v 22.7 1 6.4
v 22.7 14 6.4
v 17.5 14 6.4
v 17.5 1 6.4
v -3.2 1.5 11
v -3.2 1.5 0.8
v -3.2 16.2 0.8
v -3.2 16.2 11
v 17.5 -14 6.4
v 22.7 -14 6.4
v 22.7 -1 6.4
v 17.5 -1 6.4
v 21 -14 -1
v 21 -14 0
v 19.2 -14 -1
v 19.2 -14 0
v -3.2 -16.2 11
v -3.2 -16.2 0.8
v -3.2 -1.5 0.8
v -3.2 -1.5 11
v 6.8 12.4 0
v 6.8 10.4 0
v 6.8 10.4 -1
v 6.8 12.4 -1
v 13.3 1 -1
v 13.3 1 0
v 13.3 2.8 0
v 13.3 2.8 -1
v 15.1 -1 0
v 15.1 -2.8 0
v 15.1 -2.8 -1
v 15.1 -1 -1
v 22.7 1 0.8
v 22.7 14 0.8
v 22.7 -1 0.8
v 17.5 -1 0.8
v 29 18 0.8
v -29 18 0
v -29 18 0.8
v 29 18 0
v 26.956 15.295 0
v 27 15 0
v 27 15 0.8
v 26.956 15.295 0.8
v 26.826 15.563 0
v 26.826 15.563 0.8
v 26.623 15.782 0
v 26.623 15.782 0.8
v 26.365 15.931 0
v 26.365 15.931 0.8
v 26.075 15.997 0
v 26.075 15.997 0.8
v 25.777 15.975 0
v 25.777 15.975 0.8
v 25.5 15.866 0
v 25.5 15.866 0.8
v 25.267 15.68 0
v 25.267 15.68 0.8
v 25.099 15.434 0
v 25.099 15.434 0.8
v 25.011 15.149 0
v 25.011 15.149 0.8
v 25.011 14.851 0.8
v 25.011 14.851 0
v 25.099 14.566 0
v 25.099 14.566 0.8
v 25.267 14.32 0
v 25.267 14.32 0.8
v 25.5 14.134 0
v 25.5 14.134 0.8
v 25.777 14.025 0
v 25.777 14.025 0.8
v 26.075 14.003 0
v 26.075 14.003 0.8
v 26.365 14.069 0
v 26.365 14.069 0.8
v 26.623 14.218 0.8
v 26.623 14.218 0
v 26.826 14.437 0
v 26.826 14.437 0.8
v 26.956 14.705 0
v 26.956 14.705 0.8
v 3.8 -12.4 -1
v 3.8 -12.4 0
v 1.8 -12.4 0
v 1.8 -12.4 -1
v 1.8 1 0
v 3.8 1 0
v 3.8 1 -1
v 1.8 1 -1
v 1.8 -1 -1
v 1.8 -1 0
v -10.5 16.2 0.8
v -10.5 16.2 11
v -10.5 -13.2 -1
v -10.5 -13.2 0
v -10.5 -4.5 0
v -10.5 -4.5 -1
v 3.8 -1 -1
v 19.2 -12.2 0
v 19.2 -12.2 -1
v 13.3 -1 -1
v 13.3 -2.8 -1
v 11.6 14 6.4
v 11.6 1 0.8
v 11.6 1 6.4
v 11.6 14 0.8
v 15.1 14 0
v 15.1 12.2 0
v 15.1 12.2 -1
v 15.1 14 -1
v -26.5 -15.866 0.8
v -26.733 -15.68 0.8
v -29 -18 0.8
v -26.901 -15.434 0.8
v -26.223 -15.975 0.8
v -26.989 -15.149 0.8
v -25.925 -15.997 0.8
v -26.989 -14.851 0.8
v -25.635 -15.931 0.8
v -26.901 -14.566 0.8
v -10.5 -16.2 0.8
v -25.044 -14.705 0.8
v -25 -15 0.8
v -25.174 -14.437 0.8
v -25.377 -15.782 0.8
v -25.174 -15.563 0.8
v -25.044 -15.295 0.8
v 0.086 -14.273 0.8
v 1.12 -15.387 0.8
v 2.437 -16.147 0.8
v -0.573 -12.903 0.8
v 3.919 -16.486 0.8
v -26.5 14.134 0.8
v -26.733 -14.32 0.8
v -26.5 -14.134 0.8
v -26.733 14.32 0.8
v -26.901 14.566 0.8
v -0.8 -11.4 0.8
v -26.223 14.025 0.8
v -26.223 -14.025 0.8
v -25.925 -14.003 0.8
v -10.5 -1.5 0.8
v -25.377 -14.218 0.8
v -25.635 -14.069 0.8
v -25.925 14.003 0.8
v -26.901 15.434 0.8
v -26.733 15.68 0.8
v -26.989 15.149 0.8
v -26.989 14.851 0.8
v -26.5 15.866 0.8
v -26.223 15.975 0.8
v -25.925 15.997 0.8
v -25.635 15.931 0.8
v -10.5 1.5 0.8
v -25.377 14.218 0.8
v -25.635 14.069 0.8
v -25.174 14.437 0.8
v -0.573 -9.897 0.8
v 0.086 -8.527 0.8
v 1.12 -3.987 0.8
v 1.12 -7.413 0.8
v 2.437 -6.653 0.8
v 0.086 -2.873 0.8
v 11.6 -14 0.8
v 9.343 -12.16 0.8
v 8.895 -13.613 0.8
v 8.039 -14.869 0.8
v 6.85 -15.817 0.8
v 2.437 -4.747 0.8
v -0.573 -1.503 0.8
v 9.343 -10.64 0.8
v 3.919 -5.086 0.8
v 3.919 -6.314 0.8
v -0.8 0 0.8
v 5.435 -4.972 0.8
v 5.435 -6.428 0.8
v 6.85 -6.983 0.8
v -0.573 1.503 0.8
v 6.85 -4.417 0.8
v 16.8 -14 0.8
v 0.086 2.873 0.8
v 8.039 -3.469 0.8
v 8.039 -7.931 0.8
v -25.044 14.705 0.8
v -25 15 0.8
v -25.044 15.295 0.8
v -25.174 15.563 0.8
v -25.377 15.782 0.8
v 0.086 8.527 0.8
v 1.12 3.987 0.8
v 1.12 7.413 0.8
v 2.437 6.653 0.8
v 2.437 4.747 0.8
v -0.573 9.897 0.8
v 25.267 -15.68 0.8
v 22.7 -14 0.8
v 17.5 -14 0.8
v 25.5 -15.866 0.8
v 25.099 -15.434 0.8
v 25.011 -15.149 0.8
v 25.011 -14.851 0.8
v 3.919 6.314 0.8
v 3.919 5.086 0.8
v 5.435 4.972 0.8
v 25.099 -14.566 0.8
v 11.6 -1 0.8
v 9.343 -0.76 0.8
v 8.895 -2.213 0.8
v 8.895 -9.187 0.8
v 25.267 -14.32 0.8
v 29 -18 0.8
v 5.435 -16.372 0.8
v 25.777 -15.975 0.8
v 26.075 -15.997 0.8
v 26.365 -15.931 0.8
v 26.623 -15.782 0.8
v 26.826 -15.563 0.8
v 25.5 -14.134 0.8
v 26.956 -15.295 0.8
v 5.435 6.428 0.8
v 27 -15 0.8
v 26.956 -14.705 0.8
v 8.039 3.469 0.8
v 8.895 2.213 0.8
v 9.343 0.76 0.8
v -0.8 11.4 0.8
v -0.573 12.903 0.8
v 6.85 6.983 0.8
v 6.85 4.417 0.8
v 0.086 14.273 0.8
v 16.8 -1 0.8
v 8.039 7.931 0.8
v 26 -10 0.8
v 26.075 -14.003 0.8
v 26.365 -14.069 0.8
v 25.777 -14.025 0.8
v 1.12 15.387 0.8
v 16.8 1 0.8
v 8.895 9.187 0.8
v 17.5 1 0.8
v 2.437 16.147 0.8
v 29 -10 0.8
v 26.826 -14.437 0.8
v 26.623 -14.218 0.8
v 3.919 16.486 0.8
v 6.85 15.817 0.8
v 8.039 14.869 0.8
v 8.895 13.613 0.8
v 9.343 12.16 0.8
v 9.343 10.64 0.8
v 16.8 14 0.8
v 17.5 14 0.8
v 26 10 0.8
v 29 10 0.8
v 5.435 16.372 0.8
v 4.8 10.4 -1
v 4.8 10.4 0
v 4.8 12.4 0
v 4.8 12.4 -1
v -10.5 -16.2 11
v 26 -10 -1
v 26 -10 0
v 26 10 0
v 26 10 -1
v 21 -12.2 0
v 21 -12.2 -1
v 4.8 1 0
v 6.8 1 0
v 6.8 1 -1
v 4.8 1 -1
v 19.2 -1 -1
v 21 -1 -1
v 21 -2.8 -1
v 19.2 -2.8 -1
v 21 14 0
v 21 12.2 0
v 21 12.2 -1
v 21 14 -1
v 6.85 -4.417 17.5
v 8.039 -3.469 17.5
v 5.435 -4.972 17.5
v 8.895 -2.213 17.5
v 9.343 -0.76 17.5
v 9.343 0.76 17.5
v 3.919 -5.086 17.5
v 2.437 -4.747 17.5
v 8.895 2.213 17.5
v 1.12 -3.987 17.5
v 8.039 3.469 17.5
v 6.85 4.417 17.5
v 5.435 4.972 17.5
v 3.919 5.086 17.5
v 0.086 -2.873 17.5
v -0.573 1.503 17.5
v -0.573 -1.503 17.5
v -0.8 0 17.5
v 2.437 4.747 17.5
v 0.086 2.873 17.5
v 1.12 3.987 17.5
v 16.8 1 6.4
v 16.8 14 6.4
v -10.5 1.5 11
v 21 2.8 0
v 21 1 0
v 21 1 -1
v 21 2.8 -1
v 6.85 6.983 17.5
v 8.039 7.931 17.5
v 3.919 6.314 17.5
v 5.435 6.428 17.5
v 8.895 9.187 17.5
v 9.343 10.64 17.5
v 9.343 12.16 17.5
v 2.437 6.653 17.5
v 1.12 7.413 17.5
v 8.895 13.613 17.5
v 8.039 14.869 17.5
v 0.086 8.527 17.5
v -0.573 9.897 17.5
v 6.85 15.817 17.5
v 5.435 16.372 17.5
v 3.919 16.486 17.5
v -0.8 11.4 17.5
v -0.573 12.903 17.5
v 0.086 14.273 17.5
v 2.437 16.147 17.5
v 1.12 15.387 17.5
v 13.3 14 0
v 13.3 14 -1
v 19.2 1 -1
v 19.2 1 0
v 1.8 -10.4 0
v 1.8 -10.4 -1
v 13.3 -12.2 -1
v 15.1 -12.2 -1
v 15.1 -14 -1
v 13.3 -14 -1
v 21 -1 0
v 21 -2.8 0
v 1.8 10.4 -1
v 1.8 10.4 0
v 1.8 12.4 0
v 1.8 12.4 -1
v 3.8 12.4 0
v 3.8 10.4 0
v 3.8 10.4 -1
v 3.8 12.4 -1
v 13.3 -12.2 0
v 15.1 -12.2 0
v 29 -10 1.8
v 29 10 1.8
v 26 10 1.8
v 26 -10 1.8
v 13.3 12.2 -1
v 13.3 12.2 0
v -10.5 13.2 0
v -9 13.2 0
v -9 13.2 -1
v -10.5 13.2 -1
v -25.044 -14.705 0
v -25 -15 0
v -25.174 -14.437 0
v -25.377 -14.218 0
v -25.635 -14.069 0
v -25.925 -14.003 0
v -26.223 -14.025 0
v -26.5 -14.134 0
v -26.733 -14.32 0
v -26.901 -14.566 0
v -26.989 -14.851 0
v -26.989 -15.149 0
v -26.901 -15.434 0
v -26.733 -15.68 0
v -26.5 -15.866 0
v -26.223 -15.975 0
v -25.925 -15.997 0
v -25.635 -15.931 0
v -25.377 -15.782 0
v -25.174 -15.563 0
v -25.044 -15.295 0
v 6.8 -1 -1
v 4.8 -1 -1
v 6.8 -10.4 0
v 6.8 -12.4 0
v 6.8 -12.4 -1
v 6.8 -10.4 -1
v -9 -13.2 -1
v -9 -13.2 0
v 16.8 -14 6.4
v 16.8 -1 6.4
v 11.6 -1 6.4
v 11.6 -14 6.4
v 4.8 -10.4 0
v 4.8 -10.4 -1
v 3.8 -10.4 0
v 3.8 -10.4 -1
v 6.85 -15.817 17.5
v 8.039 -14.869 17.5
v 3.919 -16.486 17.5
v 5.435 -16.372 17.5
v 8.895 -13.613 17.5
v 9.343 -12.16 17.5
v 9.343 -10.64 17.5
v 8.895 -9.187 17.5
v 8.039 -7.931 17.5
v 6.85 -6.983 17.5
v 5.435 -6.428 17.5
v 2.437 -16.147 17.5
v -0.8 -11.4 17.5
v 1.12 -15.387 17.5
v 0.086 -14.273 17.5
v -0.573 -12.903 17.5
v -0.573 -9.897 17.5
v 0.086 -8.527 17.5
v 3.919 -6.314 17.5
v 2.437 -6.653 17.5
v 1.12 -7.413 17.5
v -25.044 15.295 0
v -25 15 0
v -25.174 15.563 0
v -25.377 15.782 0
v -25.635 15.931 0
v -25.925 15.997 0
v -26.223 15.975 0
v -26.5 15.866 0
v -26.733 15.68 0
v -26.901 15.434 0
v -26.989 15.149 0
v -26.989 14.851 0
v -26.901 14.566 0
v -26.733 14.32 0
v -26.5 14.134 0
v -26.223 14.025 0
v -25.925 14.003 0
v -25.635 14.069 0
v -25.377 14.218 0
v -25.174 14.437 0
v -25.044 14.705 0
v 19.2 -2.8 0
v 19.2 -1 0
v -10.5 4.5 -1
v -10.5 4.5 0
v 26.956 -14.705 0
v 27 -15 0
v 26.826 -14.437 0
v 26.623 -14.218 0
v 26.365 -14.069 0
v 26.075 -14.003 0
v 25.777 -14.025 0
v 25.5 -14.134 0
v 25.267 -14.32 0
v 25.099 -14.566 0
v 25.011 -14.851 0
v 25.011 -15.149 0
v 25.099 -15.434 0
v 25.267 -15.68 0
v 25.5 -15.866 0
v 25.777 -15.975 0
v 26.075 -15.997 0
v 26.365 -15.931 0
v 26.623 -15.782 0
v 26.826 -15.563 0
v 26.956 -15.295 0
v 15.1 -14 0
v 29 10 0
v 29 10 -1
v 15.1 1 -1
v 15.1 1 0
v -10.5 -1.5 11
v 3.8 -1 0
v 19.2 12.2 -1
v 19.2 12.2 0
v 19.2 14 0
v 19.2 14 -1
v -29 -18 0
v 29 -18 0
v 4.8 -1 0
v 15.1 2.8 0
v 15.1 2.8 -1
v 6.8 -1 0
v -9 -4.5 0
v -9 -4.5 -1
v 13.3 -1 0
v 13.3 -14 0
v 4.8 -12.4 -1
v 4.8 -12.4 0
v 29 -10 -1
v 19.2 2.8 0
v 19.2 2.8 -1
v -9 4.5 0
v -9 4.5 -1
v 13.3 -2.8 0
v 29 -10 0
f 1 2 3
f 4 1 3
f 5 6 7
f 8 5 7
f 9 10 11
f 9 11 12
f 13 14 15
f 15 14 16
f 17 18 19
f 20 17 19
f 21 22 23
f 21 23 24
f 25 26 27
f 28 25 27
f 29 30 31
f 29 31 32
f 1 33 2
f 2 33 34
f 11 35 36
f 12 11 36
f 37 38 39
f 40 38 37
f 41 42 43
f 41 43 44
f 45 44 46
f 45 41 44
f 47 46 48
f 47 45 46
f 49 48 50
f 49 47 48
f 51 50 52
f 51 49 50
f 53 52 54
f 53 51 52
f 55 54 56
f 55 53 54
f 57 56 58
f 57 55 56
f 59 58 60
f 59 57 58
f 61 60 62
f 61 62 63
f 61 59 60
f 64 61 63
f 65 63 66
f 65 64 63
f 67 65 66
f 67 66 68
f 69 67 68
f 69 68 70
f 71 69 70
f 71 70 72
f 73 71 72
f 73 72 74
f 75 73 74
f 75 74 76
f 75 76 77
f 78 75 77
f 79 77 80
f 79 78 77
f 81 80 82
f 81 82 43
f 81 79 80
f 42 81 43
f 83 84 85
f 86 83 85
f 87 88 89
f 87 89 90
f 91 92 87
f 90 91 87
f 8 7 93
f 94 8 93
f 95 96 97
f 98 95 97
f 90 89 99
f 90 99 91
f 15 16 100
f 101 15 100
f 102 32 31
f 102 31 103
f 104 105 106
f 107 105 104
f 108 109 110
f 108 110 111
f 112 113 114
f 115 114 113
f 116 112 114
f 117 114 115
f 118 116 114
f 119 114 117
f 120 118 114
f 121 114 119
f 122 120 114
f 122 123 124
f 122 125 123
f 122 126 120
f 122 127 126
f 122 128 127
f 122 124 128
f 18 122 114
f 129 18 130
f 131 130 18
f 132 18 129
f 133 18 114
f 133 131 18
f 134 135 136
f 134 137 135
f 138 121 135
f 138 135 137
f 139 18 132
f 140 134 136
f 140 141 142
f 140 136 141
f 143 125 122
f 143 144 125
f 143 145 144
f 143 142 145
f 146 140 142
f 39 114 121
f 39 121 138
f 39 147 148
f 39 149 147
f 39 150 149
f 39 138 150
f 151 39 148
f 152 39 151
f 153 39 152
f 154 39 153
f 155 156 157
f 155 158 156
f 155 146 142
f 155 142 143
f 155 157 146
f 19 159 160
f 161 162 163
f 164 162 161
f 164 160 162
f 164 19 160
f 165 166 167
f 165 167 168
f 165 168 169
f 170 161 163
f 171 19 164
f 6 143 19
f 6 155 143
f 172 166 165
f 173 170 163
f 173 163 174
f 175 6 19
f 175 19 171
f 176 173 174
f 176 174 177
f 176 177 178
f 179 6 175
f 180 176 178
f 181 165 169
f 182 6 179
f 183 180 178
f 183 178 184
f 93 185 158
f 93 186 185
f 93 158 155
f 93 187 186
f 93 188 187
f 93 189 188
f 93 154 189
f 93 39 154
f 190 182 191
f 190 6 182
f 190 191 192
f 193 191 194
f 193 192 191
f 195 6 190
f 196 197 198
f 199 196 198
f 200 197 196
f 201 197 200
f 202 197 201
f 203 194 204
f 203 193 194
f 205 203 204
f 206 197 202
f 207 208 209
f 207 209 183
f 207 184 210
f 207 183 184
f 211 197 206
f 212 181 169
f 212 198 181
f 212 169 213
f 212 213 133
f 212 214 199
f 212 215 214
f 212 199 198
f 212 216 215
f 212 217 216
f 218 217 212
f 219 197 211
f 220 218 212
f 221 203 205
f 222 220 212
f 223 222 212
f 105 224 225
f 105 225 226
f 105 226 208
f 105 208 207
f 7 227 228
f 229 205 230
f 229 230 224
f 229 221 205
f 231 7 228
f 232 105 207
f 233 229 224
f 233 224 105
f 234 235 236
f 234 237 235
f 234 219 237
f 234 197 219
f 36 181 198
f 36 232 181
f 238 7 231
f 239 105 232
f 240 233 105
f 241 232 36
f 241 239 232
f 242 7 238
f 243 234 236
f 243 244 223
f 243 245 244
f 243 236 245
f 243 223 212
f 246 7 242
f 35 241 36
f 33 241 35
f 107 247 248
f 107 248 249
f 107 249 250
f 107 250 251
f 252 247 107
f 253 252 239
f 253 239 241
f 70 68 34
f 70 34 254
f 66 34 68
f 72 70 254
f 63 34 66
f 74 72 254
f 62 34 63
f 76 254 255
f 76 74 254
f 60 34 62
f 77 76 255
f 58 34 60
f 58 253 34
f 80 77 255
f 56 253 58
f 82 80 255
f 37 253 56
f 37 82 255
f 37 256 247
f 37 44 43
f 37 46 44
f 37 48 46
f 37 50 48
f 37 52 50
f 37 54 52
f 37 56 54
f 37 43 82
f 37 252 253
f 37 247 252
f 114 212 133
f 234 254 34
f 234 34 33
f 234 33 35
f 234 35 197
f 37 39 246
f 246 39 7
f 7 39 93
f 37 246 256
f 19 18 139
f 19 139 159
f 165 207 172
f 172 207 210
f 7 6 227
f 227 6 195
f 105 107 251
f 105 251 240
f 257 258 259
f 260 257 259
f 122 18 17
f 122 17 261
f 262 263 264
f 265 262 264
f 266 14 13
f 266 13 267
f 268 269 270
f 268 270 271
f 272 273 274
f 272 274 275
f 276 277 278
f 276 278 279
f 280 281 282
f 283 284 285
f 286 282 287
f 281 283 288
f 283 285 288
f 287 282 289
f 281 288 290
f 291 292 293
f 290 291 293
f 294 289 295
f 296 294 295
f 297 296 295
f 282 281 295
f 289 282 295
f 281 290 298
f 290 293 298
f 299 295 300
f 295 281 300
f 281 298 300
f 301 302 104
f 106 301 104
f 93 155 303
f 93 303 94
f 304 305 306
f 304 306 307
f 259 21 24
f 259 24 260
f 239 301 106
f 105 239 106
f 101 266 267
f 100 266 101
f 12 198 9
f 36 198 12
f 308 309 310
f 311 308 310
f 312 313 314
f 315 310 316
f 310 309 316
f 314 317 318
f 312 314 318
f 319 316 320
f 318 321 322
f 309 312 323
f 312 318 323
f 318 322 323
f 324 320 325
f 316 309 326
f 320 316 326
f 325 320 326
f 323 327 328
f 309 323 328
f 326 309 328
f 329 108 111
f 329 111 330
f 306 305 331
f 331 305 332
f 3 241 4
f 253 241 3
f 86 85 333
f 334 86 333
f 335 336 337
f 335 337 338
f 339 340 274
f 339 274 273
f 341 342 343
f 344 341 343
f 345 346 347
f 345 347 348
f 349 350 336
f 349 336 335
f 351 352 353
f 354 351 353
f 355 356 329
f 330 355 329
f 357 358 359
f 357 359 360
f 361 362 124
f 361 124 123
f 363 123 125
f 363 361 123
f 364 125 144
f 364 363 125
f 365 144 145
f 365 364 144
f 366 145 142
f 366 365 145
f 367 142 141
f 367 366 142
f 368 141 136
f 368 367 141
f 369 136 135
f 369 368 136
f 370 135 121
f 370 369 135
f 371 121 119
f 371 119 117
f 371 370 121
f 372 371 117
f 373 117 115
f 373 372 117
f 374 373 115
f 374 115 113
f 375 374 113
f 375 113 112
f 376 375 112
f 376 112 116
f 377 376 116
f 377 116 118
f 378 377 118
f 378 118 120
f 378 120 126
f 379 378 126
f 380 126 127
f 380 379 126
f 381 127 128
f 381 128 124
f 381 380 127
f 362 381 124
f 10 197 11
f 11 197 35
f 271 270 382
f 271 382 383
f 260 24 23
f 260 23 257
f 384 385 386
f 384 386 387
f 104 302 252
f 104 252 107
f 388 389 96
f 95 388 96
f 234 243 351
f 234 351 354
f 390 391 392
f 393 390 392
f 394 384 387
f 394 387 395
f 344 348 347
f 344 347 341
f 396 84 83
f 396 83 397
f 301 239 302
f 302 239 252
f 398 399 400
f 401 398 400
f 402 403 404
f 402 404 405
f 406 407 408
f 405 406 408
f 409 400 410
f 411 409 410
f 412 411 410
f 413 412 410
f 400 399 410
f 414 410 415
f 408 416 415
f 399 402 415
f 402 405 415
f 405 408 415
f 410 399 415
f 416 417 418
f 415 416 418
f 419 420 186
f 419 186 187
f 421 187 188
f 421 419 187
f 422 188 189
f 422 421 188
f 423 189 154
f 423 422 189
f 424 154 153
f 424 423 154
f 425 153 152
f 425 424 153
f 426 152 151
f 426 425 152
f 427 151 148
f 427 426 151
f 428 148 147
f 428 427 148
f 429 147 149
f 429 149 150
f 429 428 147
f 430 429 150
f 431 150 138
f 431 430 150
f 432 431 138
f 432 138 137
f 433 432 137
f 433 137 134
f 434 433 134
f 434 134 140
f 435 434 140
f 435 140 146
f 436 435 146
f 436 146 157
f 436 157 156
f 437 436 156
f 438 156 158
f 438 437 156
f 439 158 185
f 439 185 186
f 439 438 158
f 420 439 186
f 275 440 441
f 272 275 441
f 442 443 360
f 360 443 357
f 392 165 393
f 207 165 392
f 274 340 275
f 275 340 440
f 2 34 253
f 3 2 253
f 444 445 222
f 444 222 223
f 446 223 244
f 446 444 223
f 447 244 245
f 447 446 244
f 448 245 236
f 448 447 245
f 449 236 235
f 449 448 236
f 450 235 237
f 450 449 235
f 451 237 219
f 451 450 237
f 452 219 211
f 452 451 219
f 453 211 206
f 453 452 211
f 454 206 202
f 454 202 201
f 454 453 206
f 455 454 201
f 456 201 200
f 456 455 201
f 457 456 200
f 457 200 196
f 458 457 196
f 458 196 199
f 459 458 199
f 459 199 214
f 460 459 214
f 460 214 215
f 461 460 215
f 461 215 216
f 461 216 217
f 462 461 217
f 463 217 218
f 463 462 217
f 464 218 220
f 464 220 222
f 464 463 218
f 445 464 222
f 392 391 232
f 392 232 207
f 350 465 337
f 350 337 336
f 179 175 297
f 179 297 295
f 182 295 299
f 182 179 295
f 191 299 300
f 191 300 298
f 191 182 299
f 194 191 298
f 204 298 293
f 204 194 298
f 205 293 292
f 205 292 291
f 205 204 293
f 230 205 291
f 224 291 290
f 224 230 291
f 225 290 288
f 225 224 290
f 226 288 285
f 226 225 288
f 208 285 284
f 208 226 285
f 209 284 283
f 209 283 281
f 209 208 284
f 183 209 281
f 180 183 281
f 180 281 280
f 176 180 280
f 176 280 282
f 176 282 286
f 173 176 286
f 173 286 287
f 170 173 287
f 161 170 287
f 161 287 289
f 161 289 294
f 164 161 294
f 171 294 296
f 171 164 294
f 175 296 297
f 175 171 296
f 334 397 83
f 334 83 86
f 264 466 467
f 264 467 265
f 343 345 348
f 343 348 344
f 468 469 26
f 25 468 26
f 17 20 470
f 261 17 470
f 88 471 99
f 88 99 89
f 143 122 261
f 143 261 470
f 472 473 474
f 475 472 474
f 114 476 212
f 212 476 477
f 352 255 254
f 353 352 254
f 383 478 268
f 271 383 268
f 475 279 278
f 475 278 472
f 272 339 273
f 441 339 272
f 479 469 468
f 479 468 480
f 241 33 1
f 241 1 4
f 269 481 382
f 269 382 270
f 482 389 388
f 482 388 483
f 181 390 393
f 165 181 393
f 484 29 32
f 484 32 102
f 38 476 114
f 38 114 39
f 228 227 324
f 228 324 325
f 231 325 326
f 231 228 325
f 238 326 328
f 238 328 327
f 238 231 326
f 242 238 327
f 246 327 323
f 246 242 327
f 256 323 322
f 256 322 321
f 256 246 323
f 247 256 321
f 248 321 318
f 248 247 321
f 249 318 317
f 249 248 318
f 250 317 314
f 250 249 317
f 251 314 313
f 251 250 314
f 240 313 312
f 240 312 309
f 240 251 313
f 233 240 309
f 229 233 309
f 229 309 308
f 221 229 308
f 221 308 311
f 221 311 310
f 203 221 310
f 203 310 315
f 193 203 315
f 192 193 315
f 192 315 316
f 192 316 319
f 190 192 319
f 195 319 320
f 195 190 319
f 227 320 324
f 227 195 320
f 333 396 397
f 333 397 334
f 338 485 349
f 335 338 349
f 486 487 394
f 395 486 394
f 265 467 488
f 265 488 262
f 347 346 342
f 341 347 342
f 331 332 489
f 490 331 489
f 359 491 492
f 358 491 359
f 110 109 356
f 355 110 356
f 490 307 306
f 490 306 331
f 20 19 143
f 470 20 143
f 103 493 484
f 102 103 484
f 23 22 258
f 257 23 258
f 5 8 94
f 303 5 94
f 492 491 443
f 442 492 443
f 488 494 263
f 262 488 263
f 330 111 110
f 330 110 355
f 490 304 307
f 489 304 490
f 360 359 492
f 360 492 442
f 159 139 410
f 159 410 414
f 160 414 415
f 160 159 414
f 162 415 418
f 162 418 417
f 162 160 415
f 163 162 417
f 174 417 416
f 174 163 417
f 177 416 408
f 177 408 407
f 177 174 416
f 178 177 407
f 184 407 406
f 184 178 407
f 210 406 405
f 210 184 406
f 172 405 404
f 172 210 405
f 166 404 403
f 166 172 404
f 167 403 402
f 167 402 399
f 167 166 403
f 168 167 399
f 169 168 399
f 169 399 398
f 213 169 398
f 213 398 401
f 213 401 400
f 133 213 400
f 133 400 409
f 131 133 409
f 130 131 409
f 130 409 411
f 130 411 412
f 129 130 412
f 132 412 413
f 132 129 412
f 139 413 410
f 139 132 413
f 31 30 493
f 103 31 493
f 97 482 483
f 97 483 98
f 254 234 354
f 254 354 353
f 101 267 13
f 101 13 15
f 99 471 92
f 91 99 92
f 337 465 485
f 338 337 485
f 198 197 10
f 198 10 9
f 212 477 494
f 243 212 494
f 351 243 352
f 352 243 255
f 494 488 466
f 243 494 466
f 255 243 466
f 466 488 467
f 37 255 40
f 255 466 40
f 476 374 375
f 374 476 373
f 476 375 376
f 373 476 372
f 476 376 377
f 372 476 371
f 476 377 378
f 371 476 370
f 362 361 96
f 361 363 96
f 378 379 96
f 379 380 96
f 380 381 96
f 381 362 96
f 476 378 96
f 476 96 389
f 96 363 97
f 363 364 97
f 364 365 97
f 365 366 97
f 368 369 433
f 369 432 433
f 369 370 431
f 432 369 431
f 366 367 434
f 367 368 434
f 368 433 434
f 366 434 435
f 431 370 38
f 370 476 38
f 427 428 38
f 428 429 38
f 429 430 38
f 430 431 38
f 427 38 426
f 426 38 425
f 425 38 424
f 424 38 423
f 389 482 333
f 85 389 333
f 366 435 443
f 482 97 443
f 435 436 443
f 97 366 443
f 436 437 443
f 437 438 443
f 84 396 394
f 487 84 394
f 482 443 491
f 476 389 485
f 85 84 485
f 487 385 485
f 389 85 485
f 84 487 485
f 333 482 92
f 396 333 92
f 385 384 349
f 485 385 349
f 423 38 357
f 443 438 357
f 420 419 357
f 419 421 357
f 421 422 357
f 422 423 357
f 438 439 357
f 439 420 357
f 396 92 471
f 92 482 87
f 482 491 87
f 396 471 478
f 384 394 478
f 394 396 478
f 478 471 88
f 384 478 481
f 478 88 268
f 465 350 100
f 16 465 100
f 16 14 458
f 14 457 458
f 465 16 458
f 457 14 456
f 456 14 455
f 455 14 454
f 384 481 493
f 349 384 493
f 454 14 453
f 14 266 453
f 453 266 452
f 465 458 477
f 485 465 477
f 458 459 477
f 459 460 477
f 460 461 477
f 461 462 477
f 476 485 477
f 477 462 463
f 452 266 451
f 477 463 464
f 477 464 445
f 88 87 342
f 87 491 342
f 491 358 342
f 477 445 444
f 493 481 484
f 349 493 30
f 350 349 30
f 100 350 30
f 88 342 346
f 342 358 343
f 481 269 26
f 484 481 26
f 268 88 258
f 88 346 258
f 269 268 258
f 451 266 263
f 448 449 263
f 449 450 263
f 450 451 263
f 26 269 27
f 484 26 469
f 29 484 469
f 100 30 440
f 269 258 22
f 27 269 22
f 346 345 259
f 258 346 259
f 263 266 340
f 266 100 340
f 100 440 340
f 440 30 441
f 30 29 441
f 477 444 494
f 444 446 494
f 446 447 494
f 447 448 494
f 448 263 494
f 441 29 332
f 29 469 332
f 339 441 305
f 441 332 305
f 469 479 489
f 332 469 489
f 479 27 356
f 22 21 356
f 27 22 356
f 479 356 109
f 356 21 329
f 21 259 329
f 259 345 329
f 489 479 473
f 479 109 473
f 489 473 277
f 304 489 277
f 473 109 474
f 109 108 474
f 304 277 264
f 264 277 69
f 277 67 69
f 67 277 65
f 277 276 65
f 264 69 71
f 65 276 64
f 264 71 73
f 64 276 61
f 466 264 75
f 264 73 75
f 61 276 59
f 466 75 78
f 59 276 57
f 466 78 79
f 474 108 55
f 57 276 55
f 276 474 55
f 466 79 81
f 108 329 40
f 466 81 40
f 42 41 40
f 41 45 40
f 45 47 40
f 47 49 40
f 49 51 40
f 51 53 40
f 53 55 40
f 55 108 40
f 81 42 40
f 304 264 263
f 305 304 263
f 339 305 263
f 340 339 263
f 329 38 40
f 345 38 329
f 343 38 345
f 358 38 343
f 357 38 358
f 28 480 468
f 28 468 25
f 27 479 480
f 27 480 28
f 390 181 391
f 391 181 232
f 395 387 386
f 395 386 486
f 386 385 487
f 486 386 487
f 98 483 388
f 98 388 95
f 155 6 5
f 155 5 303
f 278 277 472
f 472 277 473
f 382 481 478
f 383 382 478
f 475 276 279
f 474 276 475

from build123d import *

# Parameters (mm, degrees)
SKETCH_1_W      = 58
SKETCH_1_H      = 36
SKETCH_1_R      = 1
EXTRUDE_1_DEPTH = 0.8
SKETCH_2_W      = 1.8
SKETCH_2_H      = 1.8
EXTRUDE_2_DEPTH = 1
EXTRUDE_START   = -0.8
SKETCH_2_3_W    = 5.2
SKETCH_2_3_H    = 13
EXTRUDE_3_DEPTH = 5.6
SKETCH_3_W      = 1.5
SKETCH_3_H      = 8.7
EXTRUDE_4_DEPTH = 1
SKETCH_3_3_W    = 7.3
SKETCH_3_3_H    = 14.7
EXTRUDE_5_DEPTH = 10.2
SKETCH_4_W      = 2
SKETCH_4_H      = 2
EXTRUDE_6_DEPTH = 1
SKETCH_4_3_R    = 5.1
EXTRUDE_7_DEPTH = 16.7
SKETCH_5_W      = 3
SKETCH_5_H      = 20
EXTRUDE_8_DEPTH = 1
SKETCH_5_2_W    = 3
SKETCH_5_2_H    = 20
EXTRUDE_9_DEPTH = 1


with BuildPart() as part:
    # 草图1 → 凸台-拉伸1 (new body)
    with BuildSketch(Plane.XY):
        Rectangle(SKETCH_1_W, SKETCH_1_H)
        with Locations((-26, -15)):
            Circle(SKETCH_1_R, mode=Mode.SUBTRACT)
        with Locations((-26, 15)):
            Circle(SKETCH_1_R, mode=Mode.SUBTRACT)
        with Locations((26, 15)):
            Circle(SKETCH_1_R, mode=Mode.SUBTRACT)
        with Locations((26, -15)):
            Circle(SKETCH_1_R, mode=Mode.SUBTRACT)
    extrude(amount=EXTRUDE_1_DEPTH)

    # 草图2 → 凸台-拉伸2 (add)
    with BuildSketch(Plane(origin=(0, 0, 0), x_dir=(-1, 0, 0), z_dir=(0, 0, -1))):
        with Locations((-20.1, -13.1)):
            Rectangle(SKETCH_2_W, SKETCH_2_H)
        with Locations((-20.1, -1.9)):
            Rectangle(SKETCH_2_W, SKETCH_2_H)
        with Locations((-20.1, 1.9)):
            Rectangle(SKETCH_2_W, SKETCH_2_H)
        with Locations((-20.1, 13.1)):
            Rectangle(SKETCH_2_W, SKETCH_2_H)
        with Locations((-14.2, 13.1)):
            Rectangle(SKETCH_2_W, SKETCH_2_H)
        with Locations((-14.2, 1.9)):
            Rectangle(SKETCH_2_W, SKETCH_2_H)
        with Locations((-14.2, -1.9)):
            Rectangle(SKETCH_2_W, SKETCH_2_H)
        with Locations((-14.2, -13.1)):
            Rectangle(SKETCH_2_W, SKETCH_2_H)
    extrude(amount=EXTRUDE_2_DEPTH)

    # 草图2<3> → 凸台-拉伸3 (add)
    with BuildSketch(Plane(origin=(0, 0, 0), x_dir=(-1, 0, 0), z_dir=(0, 0, -1)).offset(EXTRUDE_START)):
        with Locations((-20.1, 7.5)):
            Rectangle(SKETCH_2_3_W, SKETCH_2_3_H)
        with Locations((-14.2, 7.5)):
            Rectangle(SKETCH_2_3_W, SKETCH_2_3_H)
        with Locations((-20.1, -7.5)):
            Rectangle(SKETCH_2_3_W, SKETCH_2_3_H)
        with Locations((-14.2, -7.5)):
            Rectangle(SKETCH_2_3_W, SKETCH_2_3_H)
    extrude(amount=-EXTRUDE_3_DEPTH)

    # 草图3 → 凸台-拉伸4 (add)
    with BuildSketch(Plane(origin=(0, 0, 0), x_dir=(-1, 0, 0), z_dir=(0, 0, -1))):
        with Locations((9.75, 8.85)):
            Rectangle(SKETCH_3_W, SKETCH_3_H)
        with Locations((9.75, -8.85)):
            Rectangle(SKETCH_3_W, SKETCH_3_H)
    extrude(amount=EXTRUDE_4_DEPTH)

    # 草图3<3> → 凸台-拉伸5 (add)
    with BuildSketch(Plane(origin=(0, 0, 0), x_dir=(-1, 0, 0), z_dir=(0, 0, -1)).offset(EXTRUDE_START)):
        with Locations((6.85, 8.85)):
            Rectangle(SKETCH_3_3_W, SKETCH_3_3_H)
        with Locations((6.85, -8.85)):
            Rectangle(SKETCH_3_3_W, SKETCH_3_3_H)
    extrude(amount=-EXTRUDE_5_DEPTH)

    # 草图4 → 凸台-拉伸6 (add)
    with BuildSketch(Plane(origin=(0, 0, 0), x_dir=(-1, 0, 0), z_dir=(0, 0, -1))):
        with Locations((-5.8, 0)):
            Rectangle(SKETCH_4_W, SKETCH_4_H)
        with Locations((-2.8, 0)):
            Rectangle(SKETCH_4_W, SKETCH_4_H)
        with Locations((-5.8, 11.4)):
            Rectangle(SKETCH_4_W, SKETCH_4_H)
        with Locations((-2.8, 11.4)):
            Rectangle(SKETCH_4_W, SKETCH_4_H)
        with Locations((-5.8, -11.4)):
            Rectangle(SKETCH_4_W, SKETCH_4_H)
        with Locations((-2.8, -11.4)):
            Rectangle(SKETCH_4_W, SKETCH_4_H)
    extrude(amount=EXTRUDE_6_DEPTH)

    # 草图4<3> → 凸台-拉伸7 (add)
    with BuildSketch(Plane(origin=(0, 0, 0), x_dir=(-1, 0, 0), z_dir=(0, 0, -1)).offset(EXTRUDE_START)):
        with Locations((-4.3, 0)):
            Circle(SKETCH_4_3_R)
        with Locations((-4.3, 11.4)):
            Circle(SKETCH_4_3_R)
        with Locations((-4.3, -11.4)):
            Circle(SKETCH_4_3_R)
    extrude(amount=-EXTRUDE_7_DEPTH)

    # 草图5 → 凸台-拉伸8 (add)
    with BuildSketch(Plane(origin=(0, 0, 0), x_dir=(-1, 0, 0), z_dir=(0, 0, -1))):
        with Locations((-27.5, 0)):
            Rectangle(SKETCH_5_W, SKETCH_5_H)
    extrude(amount=EXTRUDE_8_DEPTH)

    # 草图5<2> → 凸台-拉伸9 (add)
    with BuildSketch(Plane(origin=(0, 0, 0), x_dir=(-1, 0, 0), z_dir=(0, 0, -1)).offset(EXTRUDE_START)):
        with Locations((-27.5, 0)):
            Rectangle(SKETCH_5_2_W, SKETCH_5_2_H)
    extrude(amount=-EXTRUDE_9_DEPTH)


solid = part.part
